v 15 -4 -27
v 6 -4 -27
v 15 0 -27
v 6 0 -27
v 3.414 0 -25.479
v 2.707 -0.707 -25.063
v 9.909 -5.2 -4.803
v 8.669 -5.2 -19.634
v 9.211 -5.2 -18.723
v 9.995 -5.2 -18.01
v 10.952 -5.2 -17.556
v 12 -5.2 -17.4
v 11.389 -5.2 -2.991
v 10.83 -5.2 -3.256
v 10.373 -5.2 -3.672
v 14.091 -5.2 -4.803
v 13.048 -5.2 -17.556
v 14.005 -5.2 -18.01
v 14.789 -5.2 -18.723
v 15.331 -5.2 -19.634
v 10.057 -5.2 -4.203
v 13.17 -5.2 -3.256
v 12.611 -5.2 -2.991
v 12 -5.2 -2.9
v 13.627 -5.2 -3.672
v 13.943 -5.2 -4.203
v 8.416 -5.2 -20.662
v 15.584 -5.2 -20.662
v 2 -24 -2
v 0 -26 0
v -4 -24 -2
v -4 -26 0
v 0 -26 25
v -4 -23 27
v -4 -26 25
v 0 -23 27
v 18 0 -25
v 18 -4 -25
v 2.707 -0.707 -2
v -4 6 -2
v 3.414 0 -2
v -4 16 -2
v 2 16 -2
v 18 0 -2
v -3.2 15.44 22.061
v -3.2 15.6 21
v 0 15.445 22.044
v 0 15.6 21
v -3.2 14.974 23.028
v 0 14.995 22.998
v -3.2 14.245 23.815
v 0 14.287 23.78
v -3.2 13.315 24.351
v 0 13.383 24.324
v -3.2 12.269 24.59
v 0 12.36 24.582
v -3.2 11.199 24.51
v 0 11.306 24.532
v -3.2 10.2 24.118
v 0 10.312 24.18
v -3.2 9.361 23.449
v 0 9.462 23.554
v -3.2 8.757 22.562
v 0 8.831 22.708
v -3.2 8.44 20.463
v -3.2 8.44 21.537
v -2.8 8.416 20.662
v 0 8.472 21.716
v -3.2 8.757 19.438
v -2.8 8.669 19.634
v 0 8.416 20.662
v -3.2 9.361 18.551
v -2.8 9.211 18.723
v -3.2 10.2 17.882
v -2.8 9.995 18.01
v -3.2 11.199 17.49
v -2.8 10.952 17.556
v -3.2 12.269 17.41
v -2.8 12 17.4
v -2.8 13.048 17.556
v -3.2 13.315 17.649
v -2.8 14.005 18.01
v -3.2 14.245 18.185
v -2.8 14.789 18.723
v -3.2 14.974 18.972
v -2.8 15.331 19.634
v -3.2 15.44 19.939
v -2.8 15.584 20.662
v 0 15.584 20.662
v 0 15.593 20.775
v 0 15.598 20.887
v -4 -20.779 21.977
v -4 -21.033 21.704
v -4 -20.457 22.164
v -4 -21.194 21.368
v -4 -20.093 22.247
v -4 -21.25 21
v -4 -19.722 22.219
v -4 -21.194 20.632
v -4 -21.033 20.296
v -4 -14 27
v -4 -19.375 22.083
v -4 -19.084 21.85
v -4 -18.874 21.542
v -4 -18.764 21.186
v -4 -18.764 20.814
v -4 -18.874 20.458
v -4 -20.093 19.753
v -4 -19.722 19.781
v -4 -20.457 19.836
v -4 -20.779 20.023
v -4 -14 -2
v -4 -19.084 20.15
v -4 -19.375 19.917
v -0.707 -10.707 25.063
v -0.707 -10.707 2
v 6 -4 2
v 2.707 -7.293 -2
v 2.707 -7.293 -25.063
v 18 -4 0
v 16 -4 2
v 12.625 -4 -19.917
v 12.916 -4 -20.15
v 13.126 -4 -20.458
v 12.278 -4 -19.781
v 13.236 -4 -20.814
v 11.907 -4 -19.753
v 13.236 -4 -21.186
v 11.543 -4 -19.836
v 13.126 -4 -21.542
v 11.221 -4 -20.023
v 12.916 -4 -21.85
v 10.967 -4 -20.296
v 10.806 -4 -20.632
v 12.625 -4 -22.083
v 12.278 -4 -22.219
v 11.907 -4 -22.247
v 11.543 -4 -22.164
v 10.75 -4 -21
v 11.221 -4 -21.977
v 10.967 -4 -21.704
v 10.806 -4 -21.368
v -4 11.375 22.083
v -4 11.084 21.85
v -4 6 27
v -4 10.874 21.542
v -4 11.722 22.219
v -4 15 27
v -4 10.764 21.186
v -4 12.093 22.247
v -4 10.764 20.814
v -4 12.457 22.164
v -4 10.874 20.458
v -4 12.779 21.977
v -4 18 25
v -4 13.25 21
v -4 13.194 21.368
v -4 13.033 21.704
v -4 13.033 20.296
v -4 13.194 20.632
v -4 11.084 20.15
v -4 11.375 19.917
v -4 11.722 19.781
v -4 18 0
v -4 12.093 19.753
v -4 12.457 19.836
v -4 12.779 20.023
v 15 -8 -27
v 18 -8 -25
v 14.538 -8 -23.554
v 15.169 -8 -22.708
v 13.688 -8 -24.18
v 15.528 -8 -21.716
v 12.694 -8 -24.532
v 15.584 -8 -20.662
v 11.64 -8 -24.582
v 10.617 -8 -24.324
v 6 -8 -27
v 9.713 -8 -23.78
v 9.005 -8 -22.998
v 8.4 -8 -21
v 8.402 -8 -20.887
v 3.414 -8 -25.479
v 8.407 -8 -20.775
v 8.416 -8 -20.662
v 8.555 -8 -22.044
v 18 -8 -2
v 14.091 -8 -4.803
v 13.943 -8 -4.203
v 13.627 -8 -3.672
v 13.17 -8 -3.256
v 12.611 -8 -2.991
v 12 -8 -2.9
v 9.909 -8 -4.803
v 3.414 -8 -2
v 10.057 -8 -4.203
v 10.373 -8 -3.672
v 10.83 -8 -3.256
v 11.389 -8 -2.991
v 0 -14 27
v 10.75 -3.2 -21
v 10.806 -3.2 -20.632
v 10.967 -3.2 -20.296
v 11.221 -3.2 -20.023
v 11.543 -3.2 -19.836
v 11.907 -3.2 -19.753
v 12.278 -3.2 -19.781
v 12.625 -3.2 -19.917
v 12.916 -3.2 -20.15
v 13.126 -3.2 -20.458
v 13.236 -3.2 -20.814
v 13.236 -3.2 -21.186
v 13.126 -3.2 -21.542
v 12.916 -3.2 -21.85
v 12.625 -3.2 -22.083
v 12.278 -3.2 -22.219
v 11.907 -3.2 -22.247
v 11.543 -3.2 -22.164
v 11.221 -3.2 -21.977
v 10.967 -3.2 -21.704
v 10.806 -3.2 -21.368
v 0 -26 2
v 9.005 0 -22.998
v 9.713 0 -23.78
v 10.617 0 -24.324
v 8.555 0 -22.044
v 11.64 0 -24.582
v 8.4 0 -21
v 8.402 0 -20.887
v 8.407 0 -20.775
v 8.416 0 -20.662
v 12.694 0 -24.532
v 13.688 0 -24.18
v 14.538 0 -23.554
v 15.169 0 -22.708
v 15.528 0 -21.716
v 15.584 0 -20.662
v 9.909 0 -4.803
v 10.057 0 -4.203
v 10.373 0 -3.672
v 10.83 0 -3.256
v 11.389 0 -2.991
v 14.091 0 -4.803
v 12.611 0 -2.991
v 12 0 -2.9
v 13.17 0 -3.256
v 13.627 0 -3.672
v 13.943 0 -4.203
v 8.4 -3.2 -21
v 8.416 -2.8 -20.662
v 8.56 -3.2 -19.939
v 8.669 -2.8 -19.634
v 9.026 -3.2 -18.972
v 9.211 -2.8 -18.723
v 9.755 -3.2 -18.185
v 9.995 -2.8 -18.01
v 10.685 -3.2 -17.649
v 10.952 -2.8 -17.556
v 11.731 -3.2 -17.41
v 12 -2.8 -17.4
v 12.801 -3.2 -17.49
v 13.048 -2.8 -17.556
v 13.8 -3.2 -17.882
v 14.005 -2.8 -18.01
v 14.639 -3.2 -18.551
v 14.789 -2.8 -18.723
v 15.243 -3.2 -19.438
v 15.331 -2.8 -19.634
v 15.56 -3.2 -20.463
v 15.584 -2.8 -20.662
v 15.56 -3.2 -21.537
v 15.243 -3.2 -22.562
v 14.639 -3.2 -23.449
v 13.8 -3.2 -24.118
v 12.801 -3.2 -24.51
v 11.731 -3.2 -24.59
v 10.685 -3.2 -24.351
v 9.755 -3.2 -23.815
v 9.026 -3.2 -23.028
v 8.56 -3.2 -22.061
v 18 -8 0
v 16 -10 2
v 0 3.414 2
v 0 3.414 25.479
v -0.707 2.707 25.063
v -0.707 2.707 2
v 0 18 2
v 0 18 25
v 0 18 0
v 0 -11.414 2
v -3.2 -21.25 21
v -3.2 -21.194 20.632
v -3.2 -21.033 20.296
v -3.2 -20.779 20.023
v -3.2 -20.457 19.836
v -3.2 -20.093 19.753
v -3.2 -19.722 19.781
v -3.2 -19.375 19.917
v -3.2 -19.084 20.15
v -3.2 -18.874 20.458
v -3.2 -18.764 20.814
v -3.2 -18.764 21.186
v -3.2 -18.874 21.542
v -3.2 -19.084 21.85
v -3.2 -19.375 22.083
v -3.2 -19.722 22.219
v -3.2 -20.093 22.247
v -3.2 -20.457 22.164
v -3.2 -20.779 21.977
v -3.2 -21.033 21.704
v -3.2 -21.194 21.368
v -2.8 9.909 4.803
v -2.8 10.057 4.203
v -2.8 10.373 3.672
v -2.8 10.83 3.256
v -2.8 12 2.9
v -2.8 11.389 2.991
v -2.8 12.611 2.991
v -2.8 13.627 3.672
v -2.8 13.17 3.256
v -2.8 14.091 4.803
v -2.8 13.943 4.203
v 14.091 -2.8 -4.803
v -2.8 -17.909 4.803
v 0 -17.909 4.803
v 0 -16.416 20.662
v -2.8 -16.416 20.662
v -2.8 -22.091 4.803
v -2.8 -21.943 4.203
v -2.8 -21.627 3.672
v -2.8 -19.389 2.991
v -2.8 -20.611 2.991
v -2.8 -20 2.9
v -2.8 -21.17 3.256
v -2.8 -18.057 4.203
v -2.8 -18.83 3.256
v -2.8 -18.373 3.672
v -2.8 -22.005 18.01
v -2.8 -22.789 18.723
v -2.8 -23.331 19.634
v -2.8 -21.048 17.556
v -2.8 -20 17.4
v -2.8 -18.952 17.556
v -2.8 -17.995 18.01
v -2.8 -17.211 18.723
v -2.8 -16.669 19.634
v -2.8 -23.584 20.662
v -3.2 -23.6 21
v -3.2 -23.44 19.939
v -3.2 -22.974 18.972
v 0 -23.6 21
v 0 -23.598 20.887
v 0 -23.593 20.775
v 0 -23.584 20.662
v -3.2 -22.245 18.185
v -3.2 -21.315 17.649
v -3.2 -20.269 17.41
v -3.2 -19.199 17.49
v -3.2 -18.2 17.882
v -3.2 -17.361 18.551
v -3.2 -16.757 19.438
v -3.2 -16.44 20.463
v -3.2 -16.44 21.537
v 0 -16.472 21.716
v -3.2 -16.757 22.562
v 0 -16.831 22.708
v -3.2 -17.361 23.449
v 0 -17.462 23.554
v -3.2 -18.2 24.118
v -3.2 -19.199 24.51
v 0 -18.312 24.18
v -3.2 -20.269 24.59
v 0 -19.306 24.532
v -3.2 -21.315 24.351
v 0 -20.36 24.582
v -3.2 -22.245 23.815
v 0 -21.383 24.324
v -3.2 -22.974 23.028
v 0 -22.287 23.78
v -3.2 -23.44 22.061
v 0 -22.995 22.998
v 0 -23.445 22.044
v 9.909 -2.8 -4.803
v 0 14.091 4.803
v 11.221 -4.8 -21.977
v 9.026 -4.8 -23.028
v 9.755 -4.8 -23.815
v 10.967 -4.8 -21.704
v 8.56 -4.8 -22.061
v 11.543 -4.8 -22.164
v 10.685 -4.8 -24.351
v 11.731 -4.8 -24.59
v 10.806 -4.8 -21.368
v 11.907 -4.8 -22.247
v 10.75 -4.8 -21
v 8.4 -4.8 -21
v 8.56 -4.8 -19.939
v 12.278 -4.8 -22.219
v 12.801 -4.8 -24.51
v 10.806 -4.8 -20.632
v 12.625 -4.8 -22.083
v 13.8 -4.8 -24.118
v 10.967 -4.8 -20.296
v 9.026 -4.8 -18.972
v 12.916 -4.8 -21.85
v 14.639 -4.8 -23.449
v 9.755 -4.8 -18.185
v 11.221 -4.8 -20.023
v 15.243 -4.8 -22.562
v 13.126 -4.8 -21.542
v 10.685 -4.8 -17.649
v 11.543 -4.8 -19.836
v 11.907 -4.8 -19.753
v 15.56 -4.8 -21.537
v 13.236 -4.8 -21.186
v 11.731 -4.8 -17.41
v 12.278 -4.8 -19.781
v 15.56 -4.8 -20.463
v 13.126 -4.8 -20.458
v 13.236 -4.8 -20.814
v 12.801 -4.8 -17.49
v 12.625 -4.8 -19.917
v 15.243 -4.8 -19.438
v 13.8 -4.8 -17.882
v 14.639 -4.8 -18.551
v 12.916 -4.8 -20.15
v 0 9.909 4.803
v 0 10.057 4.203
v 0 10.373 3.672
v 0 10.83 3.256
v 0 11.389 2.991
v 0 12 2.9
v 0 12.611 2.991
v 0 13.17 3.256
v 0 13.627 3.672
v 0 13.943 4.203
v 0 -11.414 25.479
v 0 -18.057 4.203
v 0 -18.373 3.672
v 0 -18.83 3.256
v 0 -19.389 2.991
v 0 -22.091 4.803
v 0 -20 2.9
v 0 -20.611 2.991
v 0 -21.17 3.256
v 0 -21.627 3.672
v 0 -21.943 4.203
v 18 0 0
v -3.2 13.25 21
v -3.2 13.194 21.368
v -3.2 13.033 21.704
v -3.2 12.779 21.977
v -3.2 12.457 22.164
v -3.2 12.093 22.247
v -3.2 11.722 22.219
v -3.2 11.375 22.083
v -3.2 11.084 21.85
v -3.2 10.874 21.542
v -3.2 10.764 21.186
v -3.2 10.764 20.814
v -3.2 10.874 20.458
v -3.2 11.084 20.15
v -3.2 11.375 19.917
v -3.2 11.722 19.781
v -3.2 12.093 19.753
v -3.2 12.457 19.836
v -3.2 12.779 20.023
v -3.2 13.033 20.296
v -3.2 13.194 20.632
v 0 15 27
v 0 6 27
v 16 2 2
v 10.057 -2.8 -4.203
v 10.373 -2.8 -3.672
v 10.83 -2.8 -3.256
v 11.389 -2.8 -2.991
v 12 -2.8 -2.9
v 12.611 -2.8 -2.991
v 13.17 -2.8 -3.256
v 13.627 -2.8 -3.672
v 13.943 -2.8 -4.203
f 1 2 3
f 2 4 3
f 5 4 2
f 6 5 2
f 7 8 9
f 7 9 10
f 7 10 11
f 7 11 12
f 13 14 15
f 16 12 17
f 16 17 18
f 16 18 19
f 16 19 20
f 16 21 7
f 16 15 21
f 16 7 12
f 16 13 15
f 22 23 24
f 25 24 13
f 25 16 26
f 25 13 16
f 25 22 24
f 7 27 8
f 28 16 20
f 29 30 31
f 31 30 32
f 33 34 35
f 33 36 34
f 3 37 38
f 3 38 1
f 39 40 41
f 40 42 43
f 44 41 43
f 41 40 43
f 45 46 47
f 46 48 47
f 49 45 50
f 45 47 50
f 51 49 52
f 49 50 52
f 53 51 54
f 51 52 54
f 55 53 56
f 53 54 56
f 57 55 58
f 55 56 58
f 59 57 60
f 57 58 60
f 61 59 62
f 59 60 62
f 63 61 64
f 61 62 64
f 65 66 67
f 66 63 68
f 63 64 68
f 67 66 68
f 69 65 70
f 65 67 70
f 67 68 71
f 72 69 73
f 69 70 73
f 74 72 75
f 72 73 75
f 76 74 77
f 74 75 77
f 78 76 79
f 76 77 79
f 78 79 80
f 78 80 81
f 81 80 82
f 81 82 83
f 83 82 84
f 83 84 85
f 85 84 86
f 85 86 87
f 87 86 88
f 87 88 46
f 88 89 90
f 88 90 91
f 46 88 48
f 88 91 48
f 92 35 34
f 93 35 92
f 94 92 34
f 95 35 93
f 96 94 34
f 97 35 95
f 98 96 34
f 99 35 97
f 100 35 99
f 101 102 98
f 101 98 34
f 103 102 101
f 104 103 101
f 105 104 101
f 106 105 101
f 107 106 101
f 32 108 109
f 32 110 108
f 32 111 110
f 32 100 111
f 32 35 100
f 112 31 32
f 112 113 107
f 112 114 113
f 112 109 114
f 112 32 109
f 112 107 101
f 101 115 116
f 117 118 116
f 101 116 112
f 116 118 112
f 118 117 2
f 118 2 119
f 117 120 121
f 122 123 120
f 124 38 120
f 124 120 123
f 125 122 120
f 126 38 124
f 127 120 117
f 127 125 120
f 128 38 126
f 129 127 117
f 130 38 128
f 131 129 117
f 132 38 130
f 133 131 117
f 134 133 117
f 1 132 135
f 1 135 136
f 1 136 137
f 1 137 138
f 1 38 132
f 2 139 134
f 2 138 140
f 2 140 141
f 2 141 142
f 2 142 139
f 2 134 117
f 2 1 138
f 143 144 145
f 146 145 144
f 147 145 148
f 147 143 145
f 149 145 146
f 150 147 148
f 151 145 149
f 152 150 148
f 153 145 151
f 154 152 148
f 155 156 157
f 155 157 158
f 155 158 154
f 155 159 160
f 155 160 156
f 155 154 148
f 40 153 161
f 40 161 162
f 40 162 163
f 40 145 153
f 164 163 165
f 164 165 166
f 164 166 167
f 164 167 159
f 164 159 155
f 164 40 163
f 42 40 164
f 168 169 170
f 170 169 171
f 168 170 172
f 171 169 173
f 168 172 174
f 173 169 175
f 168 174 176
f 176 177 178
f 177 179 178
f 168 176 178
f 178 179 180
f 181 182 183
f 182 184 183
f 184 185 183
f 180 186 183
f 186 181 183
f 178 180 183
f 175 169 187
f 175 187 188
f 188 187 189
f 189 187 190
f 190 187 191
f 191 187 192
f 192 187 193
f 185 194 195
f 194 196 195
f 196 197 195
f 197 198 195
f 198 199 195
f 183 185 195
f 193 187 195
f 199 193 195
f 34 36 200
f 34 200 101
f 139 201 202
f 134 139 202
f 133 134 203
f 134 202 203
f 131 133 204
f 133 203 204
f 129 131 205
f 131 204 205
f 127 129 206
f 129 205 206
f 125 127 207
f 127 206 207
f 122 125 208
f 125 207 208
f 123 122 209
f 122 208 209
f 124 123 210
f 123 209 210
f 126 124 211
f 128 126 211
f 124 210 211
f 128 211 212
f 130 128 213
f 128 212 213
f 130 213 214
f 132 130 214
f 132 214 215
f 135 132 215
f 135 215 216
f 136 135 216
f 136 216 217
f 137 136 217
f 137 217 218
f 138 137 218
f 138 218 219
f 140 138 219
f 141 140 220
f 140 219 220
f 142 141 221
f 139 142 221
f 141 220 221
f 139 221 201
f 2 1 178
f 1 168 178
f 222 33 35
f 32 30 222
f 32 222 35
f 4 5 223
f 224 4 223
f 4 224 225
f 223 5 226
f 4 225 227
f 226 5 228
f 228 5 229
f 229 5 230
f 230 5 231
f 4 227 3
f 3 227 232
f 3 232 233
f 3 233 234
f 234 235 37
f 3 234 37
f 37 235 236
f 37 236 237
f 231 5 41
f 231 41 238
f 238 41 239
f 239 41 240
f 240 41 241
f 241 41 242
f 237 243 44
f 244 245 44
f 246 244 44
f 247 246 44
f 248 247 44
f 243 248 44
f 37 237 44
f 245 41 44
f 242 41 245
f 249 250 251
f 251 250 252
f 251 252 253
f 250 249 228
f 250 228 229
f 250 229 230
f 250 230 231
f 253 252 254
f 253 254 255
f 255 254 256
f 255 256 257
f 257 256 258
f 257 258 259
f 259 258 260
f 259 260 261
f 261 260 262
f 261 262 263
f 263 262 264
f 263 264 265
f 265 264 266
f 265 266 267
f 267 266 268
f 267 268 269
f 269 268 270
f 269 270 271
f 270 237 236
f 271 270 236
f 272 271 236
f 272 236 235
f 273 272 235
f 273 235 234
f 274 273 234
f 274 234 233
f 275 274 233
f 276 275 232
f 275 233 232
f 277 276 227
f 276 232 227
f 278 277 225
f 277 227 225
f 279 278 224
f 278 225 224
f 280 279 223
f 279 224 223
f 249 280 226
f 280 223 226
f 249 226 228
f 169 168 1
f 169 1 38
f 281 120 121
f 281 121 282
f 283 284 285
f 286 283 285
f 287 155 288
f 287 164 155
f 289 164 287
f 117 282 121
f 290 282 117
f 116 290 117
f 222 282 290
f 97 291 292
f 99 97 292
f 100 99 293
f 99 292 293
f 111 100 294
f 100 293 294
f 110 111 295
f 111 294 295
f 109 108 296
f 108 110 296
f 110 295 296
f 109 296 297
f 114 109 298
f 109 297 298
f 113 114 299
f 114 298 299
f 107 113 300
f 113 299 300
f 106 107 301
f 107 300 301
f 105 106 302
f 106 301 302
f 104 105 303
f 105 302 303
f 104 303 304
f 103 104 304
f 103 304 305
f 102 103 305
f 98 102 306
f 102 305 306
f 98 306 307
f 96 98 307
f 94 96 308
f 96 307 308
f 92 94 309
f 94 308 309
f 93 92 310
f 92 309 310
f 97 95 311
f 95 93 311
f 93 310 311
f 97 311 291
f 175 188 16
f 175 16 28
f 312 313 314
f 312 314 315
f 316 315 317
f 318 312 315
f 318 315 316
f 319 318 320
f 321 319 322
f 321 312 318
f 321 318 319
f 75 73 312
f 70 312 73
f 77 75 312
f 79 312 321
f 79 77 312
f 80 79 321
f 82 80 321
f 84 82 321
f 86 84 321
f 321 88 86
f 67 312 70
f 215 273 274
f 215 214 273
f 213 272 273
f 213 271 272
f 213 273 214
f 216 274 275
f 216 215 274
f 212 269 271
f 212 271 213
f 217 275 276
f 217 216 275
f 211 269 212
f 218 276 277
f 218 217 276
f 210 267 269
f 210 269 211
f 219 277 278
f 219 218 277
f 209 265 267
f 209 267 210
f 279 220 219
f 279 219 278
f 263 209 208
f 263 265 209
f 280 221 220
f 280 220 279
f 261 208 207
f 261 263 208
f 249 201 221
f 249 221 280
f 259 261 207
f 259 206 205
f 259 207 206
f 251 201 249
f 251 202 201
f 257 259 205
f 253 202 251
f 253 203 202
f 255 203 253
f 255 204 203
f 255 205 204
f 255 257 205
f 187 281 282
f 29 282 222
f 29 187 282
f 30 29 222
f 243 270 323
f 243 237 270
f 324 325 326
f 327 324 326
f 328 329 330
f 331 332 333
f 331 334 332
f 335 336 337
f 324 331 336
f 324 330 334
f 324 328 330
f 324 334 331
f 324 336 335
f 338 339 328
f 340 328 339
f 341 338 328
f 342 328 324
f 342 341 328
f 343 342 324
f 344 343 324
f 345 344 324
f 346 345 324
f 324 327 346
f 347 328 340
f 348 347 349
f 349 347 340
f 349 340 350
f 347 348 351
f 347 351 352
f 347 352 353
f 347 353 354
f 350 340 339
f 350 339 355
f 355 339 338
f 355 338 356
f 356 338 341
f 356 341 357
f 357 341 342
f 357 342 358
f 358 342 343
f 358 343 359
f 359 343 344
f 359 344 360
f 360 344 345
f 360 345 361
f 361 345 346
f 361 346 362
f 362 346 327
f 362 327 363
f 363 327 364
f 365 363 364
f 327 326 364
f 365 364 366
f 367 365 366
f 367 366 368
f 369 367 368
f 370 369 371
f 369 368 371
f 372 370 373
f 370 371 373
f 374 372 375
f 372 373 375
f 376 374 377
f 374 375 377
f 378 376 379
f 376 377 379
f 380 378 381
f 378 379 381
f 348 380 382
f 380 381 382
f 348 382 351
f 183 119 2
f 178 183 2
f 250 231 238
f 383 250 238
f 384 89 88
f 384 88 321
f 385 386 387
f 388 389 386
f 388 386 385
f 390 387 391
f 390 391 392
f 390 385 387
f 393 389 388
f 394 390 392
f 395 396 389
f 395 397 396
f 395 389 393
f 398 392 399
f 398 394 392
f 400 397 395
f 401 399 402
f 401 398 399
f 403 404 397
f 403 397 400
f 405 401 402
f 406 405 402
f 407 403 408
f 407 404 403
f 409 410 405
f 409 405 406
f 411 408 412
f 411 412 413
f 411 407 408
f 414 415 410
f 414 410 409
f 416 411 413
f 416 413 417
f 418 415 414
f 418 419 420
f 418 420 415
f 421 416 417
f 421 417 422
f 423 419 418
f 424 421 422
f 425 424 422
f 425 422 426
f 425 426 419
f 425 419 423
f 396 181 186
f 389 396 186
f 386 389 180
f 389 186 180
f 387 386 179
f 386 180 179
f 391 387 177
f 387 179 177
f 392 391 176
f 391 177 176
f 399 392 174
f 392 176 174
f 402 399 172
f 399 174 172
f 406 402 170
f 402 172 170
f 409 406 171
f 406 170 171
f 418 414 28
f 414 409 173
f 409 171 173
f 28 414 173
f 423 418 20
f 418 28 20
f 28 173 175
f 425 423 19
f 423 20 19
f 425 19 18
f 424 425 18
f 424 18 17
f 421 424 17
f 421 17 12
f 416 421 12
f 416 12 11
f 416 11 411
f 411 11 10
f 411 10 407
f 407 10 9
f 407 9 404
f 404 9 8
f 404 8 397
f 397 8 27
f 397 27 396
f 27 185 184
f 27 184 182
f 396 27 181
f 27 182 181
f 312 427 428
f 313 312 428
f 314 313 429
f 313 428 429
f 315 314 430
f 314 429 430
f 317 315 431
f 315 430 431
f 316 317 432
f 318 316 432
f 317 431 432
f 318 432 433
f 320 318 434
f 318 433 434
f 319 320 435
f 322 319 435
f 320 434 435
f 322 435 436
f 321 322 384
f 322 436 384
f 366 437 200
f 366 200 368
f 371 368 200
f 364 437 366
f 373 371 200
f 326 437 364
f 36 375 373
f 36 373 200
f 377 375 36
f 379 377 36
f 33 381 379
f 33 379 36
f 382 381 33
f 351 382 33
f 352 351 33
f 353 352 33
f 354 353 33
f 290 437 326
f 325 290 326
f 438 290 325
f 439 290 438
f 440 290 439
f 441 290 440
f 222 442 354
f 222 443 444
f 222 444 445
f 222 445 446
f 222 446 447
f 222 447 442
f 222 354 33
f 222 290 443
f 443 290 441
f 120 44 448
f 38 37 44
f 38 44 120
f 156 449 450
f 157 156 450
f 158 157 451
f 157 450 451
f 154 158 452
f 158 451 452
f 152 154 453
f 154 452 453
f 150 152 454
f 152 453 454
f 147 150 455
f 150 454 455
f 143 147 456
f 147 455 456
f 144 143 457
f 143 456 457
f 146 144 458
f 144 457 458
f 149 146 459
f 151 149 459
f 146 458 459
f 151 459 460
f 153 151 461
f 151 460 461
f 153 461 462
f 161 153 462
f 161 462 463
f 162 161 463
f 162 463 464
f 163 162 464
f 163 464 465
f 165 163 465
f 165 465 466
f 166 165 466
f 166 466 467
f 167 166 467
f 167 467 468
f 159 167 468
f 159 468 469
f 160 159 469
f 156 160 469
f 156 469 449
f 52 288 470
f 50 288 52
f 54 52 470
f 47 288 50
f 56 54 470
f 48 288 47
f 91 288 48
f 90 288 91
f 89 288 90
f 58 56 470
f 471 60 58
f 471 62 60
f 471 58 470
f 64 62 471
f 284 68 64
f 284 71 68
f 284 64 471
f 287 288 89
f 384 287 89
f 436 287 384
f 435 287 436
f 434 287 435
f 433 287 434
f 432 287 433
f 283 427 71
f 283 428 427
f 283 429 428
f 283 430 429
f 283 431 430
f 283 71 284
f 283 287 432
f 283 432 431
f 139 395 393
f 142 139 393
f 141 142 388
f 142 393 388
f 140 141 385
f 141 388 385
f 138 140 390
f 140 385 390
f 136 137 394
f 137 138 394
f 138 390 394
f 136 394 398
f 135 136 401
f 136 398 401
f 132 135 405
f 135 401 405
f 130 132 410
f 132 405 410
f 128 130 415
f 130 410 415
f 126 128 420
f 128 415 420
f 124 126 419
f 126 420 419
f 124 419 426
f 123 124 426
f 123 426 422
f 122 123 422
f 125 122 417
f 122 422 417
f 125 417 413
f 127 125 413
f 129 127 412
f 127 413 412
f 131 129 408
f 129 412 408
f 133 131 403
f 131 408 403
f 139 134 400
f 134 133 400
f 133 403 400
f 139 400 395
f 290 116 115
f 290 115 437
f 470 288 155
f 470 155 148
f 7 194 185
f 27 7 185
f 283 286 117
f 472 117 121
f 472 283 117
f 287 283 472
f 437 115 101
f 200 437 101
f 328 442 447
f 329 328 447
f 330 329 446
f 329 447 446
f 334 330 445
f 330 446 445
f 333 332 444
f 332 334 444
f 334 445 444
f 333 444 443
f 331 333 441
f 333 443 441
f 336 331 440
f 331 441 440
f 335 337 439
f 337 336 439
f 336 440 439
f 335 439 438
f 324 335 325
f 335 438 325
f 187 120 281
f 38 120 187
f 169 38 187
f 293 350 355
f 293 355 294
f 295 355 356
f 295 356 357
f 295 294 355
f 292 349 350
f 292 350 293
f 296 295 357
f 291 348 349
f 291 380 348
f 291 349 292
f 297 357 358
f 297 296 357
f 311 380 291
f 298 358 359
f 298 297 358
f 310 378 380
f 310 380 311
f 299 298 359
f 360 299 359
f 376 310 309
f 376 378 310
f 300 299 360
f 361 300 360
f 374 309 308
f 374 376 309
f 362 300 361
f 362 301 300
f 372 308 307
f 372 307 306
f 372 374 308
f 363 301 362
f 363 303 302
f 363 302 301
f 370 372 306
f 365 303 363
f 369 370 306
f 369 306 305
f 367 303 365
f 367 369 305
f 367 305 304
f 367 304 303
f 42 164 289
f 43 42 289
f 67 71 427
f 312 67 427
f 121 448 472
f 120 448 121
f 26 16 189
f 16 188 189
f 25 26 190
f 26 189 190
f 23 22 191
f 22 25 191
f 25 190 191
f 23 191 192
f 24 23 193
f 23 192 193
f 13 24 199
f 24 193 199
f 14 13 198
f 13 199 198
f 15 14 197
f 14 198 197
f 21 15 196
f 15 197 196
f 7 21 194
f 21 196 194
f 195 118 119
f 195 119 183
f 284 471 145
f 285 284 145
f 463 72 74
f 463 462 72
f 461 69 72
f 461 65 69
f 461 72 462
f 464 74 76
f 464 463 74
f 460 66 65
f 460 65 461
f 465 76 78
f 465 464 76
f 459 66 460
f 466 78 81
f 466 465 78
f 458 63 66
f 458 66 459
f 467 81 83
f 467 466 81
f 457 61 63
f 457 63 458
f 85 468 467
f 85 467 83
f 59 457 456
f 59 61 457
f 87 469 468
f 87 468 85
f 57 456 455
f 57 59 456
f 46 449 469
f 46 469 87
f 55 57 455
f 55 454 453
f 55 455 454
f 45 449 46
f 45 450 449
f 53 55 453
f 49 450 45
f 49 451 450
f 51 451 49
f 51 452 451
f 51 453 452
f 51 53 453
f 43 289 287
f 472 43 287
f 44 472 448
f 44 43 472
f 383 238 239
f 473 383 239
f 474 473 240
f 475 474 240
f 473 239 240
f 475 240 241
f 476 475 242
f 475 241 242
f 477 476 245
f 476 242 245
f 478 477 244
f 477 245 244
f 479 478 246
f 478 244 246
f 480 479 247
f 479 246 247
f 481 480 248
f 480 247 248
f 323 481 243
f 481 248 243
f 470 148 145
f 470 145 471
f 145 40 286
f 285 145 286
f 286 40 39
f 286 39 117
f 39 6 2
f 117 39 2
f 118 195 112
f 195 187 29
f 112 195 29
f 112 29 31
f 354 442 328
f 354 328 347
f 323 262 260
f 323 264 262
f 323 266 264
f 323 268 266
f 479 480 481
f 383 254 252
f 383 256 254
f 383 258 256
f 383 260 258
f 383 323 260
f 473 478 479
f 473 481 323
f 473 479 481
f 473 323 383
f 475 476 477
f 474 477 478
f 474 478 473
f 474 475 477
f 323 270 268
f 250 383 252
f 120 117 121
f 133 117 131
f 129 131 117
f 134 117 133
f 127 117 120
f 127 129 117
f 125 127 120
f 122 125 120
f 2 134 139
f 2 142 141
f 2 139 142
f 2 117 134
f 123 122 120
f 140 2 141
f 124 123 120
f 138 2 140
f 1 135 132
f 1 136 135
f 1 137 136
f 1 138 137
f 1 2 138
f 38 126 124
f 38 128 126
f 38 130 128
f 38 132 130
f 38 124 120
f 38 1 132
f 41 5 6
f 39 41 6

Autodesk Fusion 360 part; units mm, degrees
sketch "Sketch1" plane through (0, 0, 0) normal (0, 0, 1) x (1, 0, 0)
  line L0 (0, 6) -> (-4, 6)
  line L1 (-4, 6) -> (-4, 18)
  line L2 (-4, 18) -> (0, 18)
  line L3 (0, 18) -> (0, 2)
  line L4 (2, 0) -> (18, 0)
  line L5 (18, 0) -> (18, -4)
  line L6 (18, -4) -> (6, -4)
  line L7 (6, -4) -> (6, 0)
  line L8 (-4, 6) -> (6, -4)
  line L9 (0, 18) -> (18, 0)
  line L10 (3.4142, 0) -> (2.7071, -0.7071)
  line L11 (0, 3.4142) -> (-0.7071, 2.7071)
extrude "Extrude1" add sketch "Sketch1" along normal mid plane 4 makes body 1
extrude "Extrude2" add sketch "Sketch1" along normal blind 27 contours L0 L3 L8 L11 | L0 L1 L2 L3 bodies 1
extrude "Extrude3" add sketch "Sketch1" against normal blind 27 contours L4 L5 L6 L7 | L4 L7 L8 L10 bodies 1
sketch "Sketch2" plane through (0, 0, 0) normal (1, 0, 0) x (0, 1, 0)
  line L0 (3.4142, 2) -> (18, 2)
  line L1 (18, 2) -> (18, 27)
  line L2 (18, 27) -> (3.4142, 27)
  line L3 (3.4142, 27) -> (3.4142, 2)
  line L4 (18, 27) -> (6, 27)
  line L5 (6, 27) -> (6, 2)
  line L6 (6, 2) -> (18, 2)
  line L7 (18, 2) -> (18, 27)
  circle A0 centre (12, 21) radius 3.6
  circle A1 centre (12, 5) radius 2.1
  line L8 (15.5841, 20.6625) -> (14.0908, 4.8031)
  line L9 (8.4159, 20.6625) -> (9.9092, 4.8031)
  circle A2 centre (12, 21) radius 1.25
  line L10 (6, 27) -> (2.6, 27)
  line L11 (2.6, 27) -> (2.6, 25)
  line L12 (2.6, 25) -> (6, 25)
  line L13 (6, 25) -> (6, 27)
  line L14 (18, 27) -> (15, 27)
  line L15 (15, 27) -> (15, 25)
  line L16 (15, 25) -> (18, 25)
  line L17 (18, 25) -> (18, 27)
  line L18 (18, 25) -> (15, 27)
  line L19 (6, 27) -> (2.6, 25)
extrude "Extrude4" cut sketch "Sketch2" against normal blind 2.8 contours A0 A1 L8 L9 | A1 bodies 1
extrude "Extrude5" cut sketch "Sketch2" against normal blind 3.2 contours A0 bodies 1
extrude "Extrude6" cut sketch "Sketch2" against normal blind 4 contours A2 bodies 1
extrude "Extrude7" cut sketch "Sketch2" against normal blind 4 contours L3 L10 L11 L19 | L2 L3 L10 L19 | L1 L2 L4 L7 L14 L17 L18 bodies 1
chamfer "Chamfer1" distance 2 angle 45 1 edges at (-2, 18, -2) on bodies 1
chamfer "Chamfer2" distance 2 angle 45 1 edges at (18, -2, 2) on bodies 1
sketch "Sketch3" plane through (0, 0, 0) normal (0, 1, 0) x (-1, 0, 0)
  line L0 (-3.4142, -2) -> (-18, -2)
  line L1 (-18, -2) -> (-18, -27)
  line L2 (-18, -27) -> (-3.4142, -27)
  line L3 (-3.4142, -27) -> (-3.4142, -2)
  line L4 (-3.4142, -2) -> (-18, -2)
  line L5 (-18, -27) -> (-15, -27)
  circle A0 centre (-12, -21) radius 3.6
  line L6 (-15, -25) -> (-18, -25)
  line L7 (-2.6, -25) -> (-6, -25)
  circle A1 centre (-12, -5) radius 2.1
  line L8 (-6, -25) -> (-6, -27)
  line L9 (-15, -27) -> (-15, -25)
  line L10 (-6, -2) -> (-18, -2)
  line L11 (-18, -27) -> (-6, -27)
  line L12 (-18, -27) -> (-3.4142, -27)
  line L13 (-18, -2) -> (-18, -27)
  circle A2 centre (-12, -21) radius 1.25
  line L14 (-6, -27) -> (-2.6, -27)
  line L15 (-15.5841, -20.6625) -> (-14.0908, -4.8031)
  line L16 (-3.4142, -27) -> (-3.4142, -2)
  line L17 (-6, -27) -> (-6, -2)
  line L18 (-18, -25) -> (-18, -27)
  line L19 (-2.6, -27) -> (-2.6, -25)
  line L20 (-18, -25) -> (-15, -27)
  line L21 (-8.4159, -20.6625) -> (-9.9092, -4.8031)
  line L22 (-6, -27) -> (-2.6, -25)
  line L23 (-18, -2) -> (-18, -27)
  point P0 (0, 0)
extrude "Extrude8" cut sketch "Sketch3" against normal blind 2.8 contours A0 A1 L15 L21 | A1 bodies 1
extrude "Extrude9" cut sketch "Sketch3" against normal blind 3.2 contours A0 bodies 1
extrude "Extrude10" cut sketch "Sketch3" against normal blind 4 contours A2 bodies 1
extrude "Extrude11" cut sketch "Sketch3" against normal blind 4 contours L3 L14 L16 L19 L22 | L2 L3 L12 L14 L16 L22 | L1 L2 L5 L11 L12 L13 L18 L20 L23 bodies 1
mirror "Mirror1" about plane through (18, -4, 0) normal (0, -1, 0) of bodies 1 makes body 2
